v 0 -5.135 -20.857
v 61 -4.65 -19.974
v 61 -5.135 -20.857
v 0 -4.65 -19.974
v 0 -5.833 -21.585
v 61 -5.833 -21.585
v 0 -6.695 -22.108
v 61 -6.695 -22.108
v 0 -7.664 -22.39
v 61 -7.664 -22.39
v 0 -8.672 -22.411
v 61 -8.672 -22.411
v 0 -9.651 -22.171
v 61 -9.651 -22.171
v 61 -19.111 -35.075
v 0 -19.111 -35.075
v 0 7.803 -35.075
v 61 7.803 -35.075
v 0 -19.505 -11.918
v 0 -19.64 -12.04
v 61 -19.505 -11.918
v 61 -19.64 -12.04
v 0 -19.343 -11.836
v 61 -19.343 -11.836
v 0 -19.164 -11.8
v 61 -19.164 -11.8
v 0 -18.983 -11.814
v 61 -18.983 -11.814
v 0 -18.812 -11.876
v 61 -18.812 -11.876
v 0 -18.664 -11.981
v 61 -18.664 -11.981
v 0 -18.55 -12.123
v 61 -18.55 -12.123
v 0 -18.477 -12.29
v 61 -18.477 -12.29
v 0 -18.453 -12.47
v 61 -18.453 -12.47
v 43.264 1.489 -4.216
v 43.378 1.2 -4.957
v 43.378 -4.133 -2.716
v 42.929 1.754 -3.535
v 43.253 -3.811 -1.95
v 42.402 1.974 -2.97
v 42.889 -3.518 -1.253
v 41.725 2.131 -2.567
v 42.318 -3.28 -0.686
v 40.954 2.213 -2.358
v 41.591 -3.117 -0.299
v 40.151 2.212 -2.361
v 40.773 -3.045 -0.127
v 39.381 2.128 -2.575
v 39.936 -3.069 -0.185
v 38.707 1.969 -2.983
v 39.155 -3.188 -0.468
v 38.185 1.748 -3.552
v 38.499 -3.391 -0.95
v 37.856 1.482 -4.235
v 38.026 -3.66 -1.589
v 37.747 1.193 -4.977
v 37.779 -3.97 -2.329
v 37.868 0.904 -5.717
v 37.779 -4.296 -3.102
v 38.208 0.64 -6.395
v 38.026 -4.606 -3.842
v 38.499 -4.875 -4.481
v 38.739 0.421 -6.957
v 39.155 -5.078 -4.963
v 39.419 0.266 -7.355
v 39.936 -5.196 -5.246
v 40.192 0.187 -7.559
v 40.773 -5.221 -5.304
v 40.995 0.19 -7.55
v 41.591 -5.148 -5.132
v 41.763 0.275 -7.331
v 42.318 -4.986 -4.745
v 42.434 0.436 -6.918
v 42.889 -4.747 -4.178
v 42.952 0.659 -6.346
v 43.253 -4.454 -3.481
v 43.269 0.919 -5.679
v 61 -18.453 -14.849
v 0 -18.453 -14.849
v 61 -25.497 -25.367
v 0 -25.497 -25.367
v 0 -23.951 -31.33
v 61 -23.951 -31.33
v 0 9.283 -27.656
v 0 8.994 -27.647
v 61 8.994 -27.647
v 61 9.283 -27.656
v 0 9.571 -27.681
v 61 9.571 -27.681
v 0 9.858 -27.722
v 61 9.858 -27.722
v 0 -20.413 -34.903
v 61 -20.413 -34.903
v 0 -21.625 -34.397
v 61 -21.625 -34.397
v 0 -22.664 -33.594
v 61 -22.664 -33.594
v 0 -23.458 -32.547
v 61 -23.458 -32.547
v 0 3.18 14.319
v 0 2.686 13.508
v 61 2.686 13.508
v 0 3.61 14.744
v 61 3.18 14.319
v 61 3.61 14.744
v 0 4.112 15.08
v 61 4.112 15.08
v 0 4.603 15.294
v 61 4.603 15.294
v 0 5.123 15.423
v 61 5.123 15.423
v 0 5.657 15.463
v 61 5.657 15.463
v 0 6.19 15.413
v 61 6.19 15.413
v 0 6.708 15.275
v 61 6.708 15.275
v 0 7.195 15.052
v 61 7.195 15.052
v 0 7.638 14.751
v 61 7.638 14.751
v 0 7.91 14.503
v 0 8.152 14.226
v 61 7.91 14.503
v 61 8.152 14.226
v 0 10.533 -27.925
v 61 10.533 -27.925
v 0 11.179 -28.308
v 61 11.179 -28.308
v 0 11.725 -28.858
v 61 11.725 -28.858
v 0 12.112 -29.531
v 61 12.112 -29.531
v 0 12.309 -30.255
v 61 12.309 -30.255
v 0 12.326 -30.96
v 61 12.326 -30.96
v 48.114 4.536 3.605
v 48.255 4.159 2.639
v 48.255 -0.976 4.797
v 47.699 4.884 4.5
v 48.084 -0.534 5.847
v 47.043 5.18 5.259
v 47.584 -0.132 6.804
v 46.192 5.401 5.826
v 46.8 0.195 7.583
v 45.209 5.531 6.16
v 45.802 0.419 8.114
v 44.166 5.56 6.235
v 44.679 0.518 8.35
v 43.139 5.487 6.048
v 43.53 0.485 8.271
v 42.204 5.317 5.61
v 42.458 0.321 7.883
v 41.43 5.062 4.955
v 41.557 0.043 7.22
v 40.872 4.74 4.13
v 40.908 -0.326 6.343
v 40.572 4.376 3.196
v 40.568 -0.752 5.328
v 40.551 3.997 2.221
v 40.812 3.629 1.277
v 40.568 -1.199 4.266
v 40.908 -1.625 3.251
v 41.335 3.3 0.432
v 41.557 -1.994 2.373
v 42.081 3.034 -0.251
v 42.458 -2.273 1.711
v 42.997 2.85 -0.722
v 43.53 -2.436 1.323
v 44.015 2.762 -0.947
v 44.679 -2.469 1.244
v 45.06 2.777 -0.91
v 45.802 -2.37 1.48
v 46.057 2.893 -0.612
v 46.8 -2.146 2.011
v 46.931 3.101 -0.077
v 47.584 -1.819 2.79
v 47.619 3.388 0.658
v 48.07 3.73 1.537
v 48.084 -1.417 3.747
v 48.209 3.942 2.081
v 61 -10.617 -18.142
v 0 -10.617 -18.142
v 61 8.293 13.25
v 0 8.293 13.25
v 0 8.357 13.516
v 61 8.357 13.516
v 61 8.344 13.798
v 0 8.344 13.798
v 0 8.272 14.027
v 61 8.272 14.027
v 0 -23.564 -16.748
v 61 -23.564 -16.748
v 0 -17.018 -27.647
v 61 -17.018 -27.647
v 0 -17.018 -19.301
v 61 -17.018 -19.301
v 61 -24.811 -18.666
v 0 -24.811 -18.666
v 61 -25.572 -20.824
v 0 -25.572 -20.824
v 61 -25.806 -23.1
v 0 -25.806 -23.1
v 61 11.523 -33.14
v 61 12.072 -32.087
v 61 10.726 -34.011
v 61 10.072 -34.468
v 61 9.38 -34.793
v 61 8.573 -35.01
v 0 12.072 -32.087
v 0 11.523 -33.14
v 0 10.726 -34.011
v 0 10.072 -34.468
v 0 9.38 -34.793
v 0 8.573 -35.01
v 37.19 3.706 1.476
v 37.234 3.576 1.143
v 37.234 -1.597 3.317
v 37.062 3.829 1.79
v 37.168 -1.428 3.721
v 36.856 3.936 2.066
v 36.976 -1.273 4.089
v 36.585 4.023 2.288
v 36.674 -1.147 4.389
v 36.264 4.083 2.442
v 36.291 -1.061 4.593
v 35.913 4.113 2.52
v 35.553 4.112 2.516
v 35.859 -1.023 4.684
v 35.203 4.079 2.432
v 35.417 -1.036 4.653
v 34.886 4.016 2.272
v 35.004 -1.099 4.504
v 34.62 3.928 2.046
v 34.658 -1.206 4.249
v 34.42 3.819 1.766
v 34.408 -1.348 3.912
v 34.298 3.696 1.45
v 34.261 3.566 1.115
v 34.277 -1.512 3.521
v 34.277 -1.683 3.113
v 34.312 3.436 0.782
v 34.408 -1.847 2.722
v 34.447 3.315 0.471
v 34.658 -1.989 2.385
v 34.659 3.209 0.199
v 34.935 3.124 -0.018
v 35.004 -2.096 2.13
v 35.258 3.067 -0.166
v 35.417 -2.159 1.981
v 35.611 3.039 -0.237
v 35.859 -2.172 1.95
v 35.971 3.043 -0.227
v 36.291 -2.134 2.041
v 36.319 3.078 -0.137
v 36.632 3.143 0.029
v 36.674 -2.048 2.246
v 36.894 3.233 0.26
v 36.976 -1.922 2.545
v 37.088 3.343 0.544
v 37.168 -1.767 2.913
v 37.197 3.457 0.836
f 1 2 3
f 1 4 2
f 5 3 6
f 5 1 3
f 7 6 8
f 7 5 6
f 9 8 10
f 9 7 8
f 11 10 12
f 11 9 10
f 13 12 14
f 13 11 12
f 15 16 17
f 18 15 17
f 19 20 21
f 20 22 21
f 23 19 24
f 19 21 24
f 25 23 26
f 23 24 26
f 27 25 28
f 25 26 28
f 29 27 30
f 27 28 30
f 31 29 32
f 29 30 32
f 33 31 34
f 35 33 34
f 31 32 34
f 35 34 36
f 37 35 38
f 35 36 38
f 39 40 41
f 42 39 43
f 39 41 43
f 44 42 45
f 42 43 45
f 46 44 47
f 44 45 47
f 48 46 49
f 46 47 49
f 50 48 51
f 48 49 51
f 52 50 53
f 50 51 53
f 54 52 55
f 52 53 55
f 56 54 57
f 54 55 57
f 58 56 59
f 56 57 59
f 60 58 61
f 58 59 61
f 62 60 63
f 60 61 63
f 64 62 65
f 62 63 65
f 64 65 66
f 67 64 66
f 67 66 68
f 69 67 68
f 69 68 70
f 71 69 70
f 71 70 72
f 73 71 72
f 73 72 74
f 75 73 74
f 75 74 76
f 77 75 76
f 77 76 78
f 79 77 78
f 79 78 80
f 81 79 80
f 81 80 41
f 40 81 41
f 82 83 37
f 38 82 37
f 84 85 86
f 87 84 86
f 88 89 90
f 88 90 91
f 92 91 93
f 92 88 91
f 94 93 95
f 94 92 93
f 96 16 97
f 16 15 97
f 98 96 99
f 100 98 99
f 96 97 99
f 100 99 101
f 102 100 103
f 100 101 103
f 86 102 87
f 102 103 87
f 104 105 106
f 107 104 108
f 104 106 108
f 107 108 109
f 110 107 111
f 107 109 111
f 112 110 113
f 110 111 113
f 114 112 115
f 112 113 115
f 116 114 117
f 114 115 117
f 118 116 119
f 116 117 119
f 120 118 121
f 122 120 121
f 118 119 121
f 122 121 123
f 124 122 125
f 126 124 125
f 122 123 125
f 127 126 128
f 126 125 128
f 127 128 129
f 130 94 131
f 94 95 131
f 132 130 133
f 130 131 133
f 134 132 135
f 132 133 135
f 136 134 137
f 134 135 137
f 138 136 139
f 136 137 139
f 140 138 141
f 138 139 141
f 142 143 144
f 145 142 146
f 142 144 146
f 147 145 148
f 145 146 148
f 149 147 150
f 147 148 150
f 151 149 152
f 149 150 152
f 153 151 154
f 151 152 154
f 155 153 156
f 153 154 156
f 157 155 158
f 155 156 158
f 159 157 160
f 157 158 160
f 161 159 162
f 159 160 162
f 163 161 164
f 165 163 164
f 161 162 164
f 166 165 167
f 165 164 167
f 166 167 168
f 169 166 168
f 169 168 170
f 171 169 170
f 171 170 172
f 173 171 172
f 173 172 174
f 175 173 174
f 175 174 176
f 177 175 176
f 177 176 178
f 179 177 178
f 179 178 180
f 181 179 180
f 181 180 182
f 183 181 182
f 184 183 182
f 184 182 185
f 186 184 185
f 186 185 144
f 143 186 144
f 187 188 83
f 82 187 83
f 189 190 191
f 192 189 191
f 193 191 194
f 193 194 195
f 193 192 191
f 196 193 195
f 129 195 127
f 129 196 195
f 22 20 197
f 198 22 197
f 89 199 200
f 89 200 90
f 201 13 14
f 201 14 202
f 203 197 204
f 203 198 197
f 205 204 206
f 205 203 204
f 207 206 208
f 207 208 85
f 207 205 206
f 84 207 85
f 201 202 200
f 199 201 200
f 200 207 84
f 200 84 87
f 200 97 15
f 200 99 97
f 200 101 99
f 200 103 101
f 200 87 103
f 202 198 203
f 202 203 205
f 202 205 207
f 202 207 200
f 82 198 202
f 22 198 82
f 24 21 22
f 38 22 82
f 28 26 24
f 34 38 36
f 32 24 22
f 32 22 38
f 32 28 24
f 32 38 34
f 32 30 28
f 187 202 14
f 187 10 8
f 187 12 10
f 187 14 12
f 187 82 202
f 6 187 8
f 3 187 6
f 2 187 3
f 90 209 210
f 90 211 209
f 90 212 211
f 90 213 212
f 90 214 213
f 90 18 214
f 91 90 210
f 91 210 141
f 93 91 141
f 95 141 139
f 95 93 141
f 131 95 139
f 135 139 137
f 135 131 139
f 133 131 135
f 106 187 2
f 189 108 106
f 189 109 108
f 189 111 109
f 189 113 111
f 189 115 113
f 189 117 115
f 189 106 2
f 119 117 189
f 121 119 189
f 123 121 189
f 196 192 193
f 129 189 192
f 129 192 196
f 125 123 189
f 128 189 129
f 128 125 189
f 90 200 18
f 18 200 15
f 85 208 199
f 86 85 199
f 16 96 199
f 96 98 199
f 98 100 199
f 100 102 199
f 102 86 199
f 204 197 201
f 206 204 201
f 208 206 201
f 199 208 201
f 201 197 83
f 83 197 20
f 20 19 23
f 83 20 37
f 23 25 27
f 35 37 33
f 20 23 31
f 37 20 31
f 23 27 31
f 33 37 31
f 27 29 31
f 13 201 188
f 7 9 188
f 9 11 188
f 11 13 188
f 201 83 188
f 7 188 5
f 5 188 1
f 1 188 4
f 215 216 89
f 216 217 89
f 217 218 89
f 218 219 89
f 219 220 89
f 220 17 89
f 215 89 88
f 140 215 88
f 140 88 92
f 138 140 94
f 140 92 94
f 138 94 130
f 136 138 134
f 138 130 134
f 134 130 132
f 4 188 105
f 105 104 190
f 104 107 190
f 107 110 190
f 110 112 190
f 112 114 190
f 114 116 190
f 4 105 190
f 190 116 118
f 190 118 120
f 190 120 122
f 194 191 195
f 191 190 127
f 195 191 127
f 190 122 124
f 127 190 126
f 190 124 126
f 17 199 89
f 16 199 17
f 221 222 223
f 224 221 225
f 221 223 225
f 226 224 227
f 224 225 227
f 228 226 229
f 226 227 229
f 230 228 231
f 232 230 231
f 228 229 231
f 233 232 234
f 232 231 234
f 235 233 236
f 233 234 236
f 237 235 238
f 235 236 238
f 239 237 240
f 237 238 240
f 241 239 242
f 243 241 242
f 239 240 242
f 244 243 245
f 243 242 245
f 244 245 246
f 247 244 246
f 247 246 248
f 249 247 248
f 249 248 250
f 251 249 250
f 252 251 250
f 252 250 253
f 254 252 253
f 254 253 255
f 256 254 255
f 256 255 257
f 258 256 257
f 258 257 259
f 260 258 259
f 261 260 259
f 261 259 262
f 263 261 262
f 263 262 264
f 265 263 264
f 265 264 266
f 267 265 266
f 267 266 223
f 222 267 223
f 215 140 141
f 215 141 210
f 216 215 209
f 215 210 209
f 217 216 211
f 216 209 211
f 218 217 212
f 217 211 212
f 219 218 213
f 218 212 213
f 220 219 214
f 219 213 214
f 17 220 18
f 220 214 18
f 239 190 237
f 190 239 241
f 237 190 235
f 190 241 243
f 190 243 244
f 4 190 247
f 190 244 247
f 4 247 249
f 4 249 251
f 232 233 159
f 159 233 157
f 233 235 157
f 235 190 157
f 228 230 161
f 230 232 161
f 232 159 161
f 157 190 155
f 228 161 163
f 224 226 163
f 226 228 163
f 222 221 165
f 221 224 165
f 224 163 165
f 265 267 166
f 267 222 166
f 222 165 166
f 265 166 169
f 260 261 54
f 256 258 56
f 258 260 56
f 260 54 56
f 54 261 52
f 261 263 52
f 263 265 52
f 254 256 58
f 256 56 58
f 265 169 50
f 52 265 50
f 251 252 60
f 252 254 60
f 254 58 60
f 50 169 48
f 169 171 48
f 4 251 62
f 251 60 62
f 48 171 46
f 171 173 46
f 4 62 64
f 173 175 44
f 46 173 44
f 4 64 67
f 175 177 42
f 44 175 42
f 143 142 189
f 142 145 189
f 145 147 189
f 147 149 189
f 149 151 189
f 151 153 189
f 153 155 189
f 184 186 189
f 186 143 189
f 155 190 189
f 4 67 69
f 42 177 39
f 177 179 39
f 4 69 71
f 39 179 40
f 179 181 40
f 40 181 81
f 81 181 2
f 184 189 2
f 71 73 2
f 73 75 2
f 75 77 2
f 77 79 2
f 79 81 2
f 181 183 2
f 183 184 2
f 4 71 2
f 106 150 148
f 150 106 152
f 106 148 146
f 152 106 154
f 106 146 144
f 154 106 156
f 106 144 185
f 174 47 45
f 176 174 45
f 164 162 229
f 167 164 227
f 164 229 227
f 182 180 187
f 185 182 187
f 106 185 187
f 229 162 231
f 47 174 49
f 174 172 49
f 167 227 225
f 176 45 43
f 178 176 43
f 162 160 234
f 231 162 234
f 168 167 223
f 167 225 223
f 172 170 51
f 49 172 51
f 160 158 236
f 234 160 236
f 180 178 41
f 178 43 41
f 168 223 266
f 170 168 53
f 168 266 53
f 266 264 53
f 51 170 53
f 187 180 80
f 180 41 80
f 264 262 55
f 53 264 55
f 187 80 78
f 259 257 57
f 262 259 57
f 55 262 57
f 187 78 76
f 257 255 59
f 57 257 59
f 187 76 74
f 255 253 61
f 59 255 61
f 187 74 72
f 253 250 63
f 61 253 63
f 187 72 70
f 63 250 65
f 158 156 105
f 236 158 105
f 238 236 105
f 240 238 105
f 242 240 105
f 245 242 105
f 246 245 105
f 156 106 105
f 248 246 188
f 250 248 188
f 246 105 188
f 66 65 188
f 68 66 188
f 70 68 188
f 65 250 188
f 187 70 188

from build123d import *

# Parameters (mm, degrees)
F1_DEPTH     = 61
F2_R         = 9.670635699
F3_R         = 0.6712415125
F4_R         = 3.1919162273
F5_R         = 4.5432418233
F6_R         = 5
F7_R         = 3.8651714317
F7_R_2       = 1.4867583823
F7_R_3       = 2.8155117611
F8_DEPTH     = 25
F10_DEPTH    = 75.5
F11_R        = 3.8627416998
F12_T1_DEPTH = 73.5452662192
F13_R        = 3
F14_R        = 1


# Not quite as in the source:
# - a fillet or chamfer that OpenCascade refuses, or shapes differently, is made with other operations: its cross-section is extruded or revolved along the edge and cut away or added


with BuildPart() as f1:
    # F0 (on Right) → F1 (new body)
    with BuildSketch(Plane.YZ):
        with BuildLine():
            add(Edge.make_bspline(
                [(18.1424543803, -35.0754142348), (0, -24.5931053673), (21.0989990325, 0), (4.9723746061, 18.9487867674)],
                knots=[0, 0, 0, 0, 55.6063422209, 55.6063422209, 55.6063422209, 55.6063422209], degree=3))
            Line((4.9723746061, 18.9487867674), (-10.6166982745, -18.1424543803))
            Line((-10.6166982745, -18.1424543803), (-18.4527349874, -14.8490475373))
            Line((-18.4527349874, -14.8490475373), (-18.4527349874, -10.6166952334))
            Line((-18.4527349874, -10.6166952334), (-26.7433237145, -20.5614495141))
            Line((-26.7433237145, -20.5614495141), (-22.9804446479, -35.0754142348))
            Line((-22.9804446479, -35.0754142348), (18.1424543803, -35.0754142348))
        make_face()
    extrude(amount=F1_DEPTH)

    # F2
    f2_edges = [f1.edges().sort_by_distance(p)[0] for p in [
        (30.5, -26.743324, -20.56145),
    ]]
    fillet(f2_edges, radius=F2_R)

    # F3
    f3_edges = [f1.edges().sort_by_distance(p)[0] for p in [
        (30.5, -18.452735, -10.616695),
    ]]
    fillet(f3_edges, radius=F3_R)

    # F4
    f4_edges = [f1.edges().sort_by_distance(p)[0] for p in [
        (30.5, 4.972375, 18.948787),
    ]]
    fillet(f4_edges, radius=F4_R)

    # F5
    f5_edges = [f1.edges().sort_by_distance(p)[0] for p in [
        (30.5, 18.142454, -35.075414),
    ]]
    fillet(f5_edges, radius=F5_R)

    # F6
    f6_edges = [f1.edges().sort_by_distance(p)[0] for p in [
        (30.5, -22.980445, -35.075414),
    ]]
    fillet(f6_edges, radius=F6_R)

    # F7 (on face) → F8 (cut)
    with BuildSketch(Plane(origin=(0, -2.542493383, 1.0685842107), x_dir=(1, 0, 0), z_dir=(0, -0.9218866721, 0.3874596286))):
        with Locations((44.390194118, 4.044146277)):
            Circle(F7_R)
        with Locations((35.7474051416, 2.4390574545)):
            Circle(F7_R_2)
        with Locations((40.5626744032, -4.1047660634)):
            Circle(F7_R_3)
    extrude(amount=-F8_DEPTH, mode=Mode.SUBTRACT)

    # F9 (on face) → F10 (cut)
    with BuildSketch(Plane.YZ.offset(61)):
        Polygon((17.7633237159, 10.0974902644), (8.4745825412, 13.7160523356), (-6.0518267564, -23.5728081316), (-17.0180739519, -19.3007495805), (-17.0180739519, -27.6472643018), (21.4816201478, -27.6472643018), align=None)
    extrude(amount=-F10_DEPTH, mode=Mode.SUBTRACT)

    # F11
    f11_edges = [f1.edges().sort_by_distance(p)[0] for p in [
        (30.5, -6.051827, -23.572808),
    ]]
    fillet(f11_edges, radius=F11_R)

    # F12: fillet of radius 5 on 1 edges, made by hand

    # F12_s2 → F12_t1 (cut)
    with BuildSketch(Plane.YZ.offset(-6.2726331096)):
        with BuildLine():
            ThreePointArc((8.9937485165, -27.6472643018), (10.5238649897, -27.8871441795), (11.9071638019, -28.5837668704))
            Line((11.9071638019, -28.5837668704), (11.9654321077, -28.5024969218))
            ThreePointArc((11.9654321077, -28.5024969218), (11.7885278554, -28.0794589932), (11.5959390896, -27.6108577379))
            Line((11.5959390896, -27.6108577379), (11.5028017603, -27.5472643018))
            Line((11.5028017603, -27.5472643018), (8.9937485165, -27.5472643018))
            Line((8.9937485165, -27.5472643018), (8.9937485165, -27.6472643018))
        make_face()
    extrude(amount=F12_T1_DEPTH, mode=Mode.SUBTRACT)

    # F13
    f13_edges = [f1.edges().sort_by_distance(p)[0] for p in [
        (30.5, 11.907164, -28.583767),
    ]]
    fillet(f13_edges, radius=F13_R)

    # F14
    f14_edges = [f1.edges().sort_by_distance(p)[0] for p in [
        (30.5, 8.474583, 13.716052),
    ]]
    fillet(f14_edges, radius=F14_R)


solid = f1.part
